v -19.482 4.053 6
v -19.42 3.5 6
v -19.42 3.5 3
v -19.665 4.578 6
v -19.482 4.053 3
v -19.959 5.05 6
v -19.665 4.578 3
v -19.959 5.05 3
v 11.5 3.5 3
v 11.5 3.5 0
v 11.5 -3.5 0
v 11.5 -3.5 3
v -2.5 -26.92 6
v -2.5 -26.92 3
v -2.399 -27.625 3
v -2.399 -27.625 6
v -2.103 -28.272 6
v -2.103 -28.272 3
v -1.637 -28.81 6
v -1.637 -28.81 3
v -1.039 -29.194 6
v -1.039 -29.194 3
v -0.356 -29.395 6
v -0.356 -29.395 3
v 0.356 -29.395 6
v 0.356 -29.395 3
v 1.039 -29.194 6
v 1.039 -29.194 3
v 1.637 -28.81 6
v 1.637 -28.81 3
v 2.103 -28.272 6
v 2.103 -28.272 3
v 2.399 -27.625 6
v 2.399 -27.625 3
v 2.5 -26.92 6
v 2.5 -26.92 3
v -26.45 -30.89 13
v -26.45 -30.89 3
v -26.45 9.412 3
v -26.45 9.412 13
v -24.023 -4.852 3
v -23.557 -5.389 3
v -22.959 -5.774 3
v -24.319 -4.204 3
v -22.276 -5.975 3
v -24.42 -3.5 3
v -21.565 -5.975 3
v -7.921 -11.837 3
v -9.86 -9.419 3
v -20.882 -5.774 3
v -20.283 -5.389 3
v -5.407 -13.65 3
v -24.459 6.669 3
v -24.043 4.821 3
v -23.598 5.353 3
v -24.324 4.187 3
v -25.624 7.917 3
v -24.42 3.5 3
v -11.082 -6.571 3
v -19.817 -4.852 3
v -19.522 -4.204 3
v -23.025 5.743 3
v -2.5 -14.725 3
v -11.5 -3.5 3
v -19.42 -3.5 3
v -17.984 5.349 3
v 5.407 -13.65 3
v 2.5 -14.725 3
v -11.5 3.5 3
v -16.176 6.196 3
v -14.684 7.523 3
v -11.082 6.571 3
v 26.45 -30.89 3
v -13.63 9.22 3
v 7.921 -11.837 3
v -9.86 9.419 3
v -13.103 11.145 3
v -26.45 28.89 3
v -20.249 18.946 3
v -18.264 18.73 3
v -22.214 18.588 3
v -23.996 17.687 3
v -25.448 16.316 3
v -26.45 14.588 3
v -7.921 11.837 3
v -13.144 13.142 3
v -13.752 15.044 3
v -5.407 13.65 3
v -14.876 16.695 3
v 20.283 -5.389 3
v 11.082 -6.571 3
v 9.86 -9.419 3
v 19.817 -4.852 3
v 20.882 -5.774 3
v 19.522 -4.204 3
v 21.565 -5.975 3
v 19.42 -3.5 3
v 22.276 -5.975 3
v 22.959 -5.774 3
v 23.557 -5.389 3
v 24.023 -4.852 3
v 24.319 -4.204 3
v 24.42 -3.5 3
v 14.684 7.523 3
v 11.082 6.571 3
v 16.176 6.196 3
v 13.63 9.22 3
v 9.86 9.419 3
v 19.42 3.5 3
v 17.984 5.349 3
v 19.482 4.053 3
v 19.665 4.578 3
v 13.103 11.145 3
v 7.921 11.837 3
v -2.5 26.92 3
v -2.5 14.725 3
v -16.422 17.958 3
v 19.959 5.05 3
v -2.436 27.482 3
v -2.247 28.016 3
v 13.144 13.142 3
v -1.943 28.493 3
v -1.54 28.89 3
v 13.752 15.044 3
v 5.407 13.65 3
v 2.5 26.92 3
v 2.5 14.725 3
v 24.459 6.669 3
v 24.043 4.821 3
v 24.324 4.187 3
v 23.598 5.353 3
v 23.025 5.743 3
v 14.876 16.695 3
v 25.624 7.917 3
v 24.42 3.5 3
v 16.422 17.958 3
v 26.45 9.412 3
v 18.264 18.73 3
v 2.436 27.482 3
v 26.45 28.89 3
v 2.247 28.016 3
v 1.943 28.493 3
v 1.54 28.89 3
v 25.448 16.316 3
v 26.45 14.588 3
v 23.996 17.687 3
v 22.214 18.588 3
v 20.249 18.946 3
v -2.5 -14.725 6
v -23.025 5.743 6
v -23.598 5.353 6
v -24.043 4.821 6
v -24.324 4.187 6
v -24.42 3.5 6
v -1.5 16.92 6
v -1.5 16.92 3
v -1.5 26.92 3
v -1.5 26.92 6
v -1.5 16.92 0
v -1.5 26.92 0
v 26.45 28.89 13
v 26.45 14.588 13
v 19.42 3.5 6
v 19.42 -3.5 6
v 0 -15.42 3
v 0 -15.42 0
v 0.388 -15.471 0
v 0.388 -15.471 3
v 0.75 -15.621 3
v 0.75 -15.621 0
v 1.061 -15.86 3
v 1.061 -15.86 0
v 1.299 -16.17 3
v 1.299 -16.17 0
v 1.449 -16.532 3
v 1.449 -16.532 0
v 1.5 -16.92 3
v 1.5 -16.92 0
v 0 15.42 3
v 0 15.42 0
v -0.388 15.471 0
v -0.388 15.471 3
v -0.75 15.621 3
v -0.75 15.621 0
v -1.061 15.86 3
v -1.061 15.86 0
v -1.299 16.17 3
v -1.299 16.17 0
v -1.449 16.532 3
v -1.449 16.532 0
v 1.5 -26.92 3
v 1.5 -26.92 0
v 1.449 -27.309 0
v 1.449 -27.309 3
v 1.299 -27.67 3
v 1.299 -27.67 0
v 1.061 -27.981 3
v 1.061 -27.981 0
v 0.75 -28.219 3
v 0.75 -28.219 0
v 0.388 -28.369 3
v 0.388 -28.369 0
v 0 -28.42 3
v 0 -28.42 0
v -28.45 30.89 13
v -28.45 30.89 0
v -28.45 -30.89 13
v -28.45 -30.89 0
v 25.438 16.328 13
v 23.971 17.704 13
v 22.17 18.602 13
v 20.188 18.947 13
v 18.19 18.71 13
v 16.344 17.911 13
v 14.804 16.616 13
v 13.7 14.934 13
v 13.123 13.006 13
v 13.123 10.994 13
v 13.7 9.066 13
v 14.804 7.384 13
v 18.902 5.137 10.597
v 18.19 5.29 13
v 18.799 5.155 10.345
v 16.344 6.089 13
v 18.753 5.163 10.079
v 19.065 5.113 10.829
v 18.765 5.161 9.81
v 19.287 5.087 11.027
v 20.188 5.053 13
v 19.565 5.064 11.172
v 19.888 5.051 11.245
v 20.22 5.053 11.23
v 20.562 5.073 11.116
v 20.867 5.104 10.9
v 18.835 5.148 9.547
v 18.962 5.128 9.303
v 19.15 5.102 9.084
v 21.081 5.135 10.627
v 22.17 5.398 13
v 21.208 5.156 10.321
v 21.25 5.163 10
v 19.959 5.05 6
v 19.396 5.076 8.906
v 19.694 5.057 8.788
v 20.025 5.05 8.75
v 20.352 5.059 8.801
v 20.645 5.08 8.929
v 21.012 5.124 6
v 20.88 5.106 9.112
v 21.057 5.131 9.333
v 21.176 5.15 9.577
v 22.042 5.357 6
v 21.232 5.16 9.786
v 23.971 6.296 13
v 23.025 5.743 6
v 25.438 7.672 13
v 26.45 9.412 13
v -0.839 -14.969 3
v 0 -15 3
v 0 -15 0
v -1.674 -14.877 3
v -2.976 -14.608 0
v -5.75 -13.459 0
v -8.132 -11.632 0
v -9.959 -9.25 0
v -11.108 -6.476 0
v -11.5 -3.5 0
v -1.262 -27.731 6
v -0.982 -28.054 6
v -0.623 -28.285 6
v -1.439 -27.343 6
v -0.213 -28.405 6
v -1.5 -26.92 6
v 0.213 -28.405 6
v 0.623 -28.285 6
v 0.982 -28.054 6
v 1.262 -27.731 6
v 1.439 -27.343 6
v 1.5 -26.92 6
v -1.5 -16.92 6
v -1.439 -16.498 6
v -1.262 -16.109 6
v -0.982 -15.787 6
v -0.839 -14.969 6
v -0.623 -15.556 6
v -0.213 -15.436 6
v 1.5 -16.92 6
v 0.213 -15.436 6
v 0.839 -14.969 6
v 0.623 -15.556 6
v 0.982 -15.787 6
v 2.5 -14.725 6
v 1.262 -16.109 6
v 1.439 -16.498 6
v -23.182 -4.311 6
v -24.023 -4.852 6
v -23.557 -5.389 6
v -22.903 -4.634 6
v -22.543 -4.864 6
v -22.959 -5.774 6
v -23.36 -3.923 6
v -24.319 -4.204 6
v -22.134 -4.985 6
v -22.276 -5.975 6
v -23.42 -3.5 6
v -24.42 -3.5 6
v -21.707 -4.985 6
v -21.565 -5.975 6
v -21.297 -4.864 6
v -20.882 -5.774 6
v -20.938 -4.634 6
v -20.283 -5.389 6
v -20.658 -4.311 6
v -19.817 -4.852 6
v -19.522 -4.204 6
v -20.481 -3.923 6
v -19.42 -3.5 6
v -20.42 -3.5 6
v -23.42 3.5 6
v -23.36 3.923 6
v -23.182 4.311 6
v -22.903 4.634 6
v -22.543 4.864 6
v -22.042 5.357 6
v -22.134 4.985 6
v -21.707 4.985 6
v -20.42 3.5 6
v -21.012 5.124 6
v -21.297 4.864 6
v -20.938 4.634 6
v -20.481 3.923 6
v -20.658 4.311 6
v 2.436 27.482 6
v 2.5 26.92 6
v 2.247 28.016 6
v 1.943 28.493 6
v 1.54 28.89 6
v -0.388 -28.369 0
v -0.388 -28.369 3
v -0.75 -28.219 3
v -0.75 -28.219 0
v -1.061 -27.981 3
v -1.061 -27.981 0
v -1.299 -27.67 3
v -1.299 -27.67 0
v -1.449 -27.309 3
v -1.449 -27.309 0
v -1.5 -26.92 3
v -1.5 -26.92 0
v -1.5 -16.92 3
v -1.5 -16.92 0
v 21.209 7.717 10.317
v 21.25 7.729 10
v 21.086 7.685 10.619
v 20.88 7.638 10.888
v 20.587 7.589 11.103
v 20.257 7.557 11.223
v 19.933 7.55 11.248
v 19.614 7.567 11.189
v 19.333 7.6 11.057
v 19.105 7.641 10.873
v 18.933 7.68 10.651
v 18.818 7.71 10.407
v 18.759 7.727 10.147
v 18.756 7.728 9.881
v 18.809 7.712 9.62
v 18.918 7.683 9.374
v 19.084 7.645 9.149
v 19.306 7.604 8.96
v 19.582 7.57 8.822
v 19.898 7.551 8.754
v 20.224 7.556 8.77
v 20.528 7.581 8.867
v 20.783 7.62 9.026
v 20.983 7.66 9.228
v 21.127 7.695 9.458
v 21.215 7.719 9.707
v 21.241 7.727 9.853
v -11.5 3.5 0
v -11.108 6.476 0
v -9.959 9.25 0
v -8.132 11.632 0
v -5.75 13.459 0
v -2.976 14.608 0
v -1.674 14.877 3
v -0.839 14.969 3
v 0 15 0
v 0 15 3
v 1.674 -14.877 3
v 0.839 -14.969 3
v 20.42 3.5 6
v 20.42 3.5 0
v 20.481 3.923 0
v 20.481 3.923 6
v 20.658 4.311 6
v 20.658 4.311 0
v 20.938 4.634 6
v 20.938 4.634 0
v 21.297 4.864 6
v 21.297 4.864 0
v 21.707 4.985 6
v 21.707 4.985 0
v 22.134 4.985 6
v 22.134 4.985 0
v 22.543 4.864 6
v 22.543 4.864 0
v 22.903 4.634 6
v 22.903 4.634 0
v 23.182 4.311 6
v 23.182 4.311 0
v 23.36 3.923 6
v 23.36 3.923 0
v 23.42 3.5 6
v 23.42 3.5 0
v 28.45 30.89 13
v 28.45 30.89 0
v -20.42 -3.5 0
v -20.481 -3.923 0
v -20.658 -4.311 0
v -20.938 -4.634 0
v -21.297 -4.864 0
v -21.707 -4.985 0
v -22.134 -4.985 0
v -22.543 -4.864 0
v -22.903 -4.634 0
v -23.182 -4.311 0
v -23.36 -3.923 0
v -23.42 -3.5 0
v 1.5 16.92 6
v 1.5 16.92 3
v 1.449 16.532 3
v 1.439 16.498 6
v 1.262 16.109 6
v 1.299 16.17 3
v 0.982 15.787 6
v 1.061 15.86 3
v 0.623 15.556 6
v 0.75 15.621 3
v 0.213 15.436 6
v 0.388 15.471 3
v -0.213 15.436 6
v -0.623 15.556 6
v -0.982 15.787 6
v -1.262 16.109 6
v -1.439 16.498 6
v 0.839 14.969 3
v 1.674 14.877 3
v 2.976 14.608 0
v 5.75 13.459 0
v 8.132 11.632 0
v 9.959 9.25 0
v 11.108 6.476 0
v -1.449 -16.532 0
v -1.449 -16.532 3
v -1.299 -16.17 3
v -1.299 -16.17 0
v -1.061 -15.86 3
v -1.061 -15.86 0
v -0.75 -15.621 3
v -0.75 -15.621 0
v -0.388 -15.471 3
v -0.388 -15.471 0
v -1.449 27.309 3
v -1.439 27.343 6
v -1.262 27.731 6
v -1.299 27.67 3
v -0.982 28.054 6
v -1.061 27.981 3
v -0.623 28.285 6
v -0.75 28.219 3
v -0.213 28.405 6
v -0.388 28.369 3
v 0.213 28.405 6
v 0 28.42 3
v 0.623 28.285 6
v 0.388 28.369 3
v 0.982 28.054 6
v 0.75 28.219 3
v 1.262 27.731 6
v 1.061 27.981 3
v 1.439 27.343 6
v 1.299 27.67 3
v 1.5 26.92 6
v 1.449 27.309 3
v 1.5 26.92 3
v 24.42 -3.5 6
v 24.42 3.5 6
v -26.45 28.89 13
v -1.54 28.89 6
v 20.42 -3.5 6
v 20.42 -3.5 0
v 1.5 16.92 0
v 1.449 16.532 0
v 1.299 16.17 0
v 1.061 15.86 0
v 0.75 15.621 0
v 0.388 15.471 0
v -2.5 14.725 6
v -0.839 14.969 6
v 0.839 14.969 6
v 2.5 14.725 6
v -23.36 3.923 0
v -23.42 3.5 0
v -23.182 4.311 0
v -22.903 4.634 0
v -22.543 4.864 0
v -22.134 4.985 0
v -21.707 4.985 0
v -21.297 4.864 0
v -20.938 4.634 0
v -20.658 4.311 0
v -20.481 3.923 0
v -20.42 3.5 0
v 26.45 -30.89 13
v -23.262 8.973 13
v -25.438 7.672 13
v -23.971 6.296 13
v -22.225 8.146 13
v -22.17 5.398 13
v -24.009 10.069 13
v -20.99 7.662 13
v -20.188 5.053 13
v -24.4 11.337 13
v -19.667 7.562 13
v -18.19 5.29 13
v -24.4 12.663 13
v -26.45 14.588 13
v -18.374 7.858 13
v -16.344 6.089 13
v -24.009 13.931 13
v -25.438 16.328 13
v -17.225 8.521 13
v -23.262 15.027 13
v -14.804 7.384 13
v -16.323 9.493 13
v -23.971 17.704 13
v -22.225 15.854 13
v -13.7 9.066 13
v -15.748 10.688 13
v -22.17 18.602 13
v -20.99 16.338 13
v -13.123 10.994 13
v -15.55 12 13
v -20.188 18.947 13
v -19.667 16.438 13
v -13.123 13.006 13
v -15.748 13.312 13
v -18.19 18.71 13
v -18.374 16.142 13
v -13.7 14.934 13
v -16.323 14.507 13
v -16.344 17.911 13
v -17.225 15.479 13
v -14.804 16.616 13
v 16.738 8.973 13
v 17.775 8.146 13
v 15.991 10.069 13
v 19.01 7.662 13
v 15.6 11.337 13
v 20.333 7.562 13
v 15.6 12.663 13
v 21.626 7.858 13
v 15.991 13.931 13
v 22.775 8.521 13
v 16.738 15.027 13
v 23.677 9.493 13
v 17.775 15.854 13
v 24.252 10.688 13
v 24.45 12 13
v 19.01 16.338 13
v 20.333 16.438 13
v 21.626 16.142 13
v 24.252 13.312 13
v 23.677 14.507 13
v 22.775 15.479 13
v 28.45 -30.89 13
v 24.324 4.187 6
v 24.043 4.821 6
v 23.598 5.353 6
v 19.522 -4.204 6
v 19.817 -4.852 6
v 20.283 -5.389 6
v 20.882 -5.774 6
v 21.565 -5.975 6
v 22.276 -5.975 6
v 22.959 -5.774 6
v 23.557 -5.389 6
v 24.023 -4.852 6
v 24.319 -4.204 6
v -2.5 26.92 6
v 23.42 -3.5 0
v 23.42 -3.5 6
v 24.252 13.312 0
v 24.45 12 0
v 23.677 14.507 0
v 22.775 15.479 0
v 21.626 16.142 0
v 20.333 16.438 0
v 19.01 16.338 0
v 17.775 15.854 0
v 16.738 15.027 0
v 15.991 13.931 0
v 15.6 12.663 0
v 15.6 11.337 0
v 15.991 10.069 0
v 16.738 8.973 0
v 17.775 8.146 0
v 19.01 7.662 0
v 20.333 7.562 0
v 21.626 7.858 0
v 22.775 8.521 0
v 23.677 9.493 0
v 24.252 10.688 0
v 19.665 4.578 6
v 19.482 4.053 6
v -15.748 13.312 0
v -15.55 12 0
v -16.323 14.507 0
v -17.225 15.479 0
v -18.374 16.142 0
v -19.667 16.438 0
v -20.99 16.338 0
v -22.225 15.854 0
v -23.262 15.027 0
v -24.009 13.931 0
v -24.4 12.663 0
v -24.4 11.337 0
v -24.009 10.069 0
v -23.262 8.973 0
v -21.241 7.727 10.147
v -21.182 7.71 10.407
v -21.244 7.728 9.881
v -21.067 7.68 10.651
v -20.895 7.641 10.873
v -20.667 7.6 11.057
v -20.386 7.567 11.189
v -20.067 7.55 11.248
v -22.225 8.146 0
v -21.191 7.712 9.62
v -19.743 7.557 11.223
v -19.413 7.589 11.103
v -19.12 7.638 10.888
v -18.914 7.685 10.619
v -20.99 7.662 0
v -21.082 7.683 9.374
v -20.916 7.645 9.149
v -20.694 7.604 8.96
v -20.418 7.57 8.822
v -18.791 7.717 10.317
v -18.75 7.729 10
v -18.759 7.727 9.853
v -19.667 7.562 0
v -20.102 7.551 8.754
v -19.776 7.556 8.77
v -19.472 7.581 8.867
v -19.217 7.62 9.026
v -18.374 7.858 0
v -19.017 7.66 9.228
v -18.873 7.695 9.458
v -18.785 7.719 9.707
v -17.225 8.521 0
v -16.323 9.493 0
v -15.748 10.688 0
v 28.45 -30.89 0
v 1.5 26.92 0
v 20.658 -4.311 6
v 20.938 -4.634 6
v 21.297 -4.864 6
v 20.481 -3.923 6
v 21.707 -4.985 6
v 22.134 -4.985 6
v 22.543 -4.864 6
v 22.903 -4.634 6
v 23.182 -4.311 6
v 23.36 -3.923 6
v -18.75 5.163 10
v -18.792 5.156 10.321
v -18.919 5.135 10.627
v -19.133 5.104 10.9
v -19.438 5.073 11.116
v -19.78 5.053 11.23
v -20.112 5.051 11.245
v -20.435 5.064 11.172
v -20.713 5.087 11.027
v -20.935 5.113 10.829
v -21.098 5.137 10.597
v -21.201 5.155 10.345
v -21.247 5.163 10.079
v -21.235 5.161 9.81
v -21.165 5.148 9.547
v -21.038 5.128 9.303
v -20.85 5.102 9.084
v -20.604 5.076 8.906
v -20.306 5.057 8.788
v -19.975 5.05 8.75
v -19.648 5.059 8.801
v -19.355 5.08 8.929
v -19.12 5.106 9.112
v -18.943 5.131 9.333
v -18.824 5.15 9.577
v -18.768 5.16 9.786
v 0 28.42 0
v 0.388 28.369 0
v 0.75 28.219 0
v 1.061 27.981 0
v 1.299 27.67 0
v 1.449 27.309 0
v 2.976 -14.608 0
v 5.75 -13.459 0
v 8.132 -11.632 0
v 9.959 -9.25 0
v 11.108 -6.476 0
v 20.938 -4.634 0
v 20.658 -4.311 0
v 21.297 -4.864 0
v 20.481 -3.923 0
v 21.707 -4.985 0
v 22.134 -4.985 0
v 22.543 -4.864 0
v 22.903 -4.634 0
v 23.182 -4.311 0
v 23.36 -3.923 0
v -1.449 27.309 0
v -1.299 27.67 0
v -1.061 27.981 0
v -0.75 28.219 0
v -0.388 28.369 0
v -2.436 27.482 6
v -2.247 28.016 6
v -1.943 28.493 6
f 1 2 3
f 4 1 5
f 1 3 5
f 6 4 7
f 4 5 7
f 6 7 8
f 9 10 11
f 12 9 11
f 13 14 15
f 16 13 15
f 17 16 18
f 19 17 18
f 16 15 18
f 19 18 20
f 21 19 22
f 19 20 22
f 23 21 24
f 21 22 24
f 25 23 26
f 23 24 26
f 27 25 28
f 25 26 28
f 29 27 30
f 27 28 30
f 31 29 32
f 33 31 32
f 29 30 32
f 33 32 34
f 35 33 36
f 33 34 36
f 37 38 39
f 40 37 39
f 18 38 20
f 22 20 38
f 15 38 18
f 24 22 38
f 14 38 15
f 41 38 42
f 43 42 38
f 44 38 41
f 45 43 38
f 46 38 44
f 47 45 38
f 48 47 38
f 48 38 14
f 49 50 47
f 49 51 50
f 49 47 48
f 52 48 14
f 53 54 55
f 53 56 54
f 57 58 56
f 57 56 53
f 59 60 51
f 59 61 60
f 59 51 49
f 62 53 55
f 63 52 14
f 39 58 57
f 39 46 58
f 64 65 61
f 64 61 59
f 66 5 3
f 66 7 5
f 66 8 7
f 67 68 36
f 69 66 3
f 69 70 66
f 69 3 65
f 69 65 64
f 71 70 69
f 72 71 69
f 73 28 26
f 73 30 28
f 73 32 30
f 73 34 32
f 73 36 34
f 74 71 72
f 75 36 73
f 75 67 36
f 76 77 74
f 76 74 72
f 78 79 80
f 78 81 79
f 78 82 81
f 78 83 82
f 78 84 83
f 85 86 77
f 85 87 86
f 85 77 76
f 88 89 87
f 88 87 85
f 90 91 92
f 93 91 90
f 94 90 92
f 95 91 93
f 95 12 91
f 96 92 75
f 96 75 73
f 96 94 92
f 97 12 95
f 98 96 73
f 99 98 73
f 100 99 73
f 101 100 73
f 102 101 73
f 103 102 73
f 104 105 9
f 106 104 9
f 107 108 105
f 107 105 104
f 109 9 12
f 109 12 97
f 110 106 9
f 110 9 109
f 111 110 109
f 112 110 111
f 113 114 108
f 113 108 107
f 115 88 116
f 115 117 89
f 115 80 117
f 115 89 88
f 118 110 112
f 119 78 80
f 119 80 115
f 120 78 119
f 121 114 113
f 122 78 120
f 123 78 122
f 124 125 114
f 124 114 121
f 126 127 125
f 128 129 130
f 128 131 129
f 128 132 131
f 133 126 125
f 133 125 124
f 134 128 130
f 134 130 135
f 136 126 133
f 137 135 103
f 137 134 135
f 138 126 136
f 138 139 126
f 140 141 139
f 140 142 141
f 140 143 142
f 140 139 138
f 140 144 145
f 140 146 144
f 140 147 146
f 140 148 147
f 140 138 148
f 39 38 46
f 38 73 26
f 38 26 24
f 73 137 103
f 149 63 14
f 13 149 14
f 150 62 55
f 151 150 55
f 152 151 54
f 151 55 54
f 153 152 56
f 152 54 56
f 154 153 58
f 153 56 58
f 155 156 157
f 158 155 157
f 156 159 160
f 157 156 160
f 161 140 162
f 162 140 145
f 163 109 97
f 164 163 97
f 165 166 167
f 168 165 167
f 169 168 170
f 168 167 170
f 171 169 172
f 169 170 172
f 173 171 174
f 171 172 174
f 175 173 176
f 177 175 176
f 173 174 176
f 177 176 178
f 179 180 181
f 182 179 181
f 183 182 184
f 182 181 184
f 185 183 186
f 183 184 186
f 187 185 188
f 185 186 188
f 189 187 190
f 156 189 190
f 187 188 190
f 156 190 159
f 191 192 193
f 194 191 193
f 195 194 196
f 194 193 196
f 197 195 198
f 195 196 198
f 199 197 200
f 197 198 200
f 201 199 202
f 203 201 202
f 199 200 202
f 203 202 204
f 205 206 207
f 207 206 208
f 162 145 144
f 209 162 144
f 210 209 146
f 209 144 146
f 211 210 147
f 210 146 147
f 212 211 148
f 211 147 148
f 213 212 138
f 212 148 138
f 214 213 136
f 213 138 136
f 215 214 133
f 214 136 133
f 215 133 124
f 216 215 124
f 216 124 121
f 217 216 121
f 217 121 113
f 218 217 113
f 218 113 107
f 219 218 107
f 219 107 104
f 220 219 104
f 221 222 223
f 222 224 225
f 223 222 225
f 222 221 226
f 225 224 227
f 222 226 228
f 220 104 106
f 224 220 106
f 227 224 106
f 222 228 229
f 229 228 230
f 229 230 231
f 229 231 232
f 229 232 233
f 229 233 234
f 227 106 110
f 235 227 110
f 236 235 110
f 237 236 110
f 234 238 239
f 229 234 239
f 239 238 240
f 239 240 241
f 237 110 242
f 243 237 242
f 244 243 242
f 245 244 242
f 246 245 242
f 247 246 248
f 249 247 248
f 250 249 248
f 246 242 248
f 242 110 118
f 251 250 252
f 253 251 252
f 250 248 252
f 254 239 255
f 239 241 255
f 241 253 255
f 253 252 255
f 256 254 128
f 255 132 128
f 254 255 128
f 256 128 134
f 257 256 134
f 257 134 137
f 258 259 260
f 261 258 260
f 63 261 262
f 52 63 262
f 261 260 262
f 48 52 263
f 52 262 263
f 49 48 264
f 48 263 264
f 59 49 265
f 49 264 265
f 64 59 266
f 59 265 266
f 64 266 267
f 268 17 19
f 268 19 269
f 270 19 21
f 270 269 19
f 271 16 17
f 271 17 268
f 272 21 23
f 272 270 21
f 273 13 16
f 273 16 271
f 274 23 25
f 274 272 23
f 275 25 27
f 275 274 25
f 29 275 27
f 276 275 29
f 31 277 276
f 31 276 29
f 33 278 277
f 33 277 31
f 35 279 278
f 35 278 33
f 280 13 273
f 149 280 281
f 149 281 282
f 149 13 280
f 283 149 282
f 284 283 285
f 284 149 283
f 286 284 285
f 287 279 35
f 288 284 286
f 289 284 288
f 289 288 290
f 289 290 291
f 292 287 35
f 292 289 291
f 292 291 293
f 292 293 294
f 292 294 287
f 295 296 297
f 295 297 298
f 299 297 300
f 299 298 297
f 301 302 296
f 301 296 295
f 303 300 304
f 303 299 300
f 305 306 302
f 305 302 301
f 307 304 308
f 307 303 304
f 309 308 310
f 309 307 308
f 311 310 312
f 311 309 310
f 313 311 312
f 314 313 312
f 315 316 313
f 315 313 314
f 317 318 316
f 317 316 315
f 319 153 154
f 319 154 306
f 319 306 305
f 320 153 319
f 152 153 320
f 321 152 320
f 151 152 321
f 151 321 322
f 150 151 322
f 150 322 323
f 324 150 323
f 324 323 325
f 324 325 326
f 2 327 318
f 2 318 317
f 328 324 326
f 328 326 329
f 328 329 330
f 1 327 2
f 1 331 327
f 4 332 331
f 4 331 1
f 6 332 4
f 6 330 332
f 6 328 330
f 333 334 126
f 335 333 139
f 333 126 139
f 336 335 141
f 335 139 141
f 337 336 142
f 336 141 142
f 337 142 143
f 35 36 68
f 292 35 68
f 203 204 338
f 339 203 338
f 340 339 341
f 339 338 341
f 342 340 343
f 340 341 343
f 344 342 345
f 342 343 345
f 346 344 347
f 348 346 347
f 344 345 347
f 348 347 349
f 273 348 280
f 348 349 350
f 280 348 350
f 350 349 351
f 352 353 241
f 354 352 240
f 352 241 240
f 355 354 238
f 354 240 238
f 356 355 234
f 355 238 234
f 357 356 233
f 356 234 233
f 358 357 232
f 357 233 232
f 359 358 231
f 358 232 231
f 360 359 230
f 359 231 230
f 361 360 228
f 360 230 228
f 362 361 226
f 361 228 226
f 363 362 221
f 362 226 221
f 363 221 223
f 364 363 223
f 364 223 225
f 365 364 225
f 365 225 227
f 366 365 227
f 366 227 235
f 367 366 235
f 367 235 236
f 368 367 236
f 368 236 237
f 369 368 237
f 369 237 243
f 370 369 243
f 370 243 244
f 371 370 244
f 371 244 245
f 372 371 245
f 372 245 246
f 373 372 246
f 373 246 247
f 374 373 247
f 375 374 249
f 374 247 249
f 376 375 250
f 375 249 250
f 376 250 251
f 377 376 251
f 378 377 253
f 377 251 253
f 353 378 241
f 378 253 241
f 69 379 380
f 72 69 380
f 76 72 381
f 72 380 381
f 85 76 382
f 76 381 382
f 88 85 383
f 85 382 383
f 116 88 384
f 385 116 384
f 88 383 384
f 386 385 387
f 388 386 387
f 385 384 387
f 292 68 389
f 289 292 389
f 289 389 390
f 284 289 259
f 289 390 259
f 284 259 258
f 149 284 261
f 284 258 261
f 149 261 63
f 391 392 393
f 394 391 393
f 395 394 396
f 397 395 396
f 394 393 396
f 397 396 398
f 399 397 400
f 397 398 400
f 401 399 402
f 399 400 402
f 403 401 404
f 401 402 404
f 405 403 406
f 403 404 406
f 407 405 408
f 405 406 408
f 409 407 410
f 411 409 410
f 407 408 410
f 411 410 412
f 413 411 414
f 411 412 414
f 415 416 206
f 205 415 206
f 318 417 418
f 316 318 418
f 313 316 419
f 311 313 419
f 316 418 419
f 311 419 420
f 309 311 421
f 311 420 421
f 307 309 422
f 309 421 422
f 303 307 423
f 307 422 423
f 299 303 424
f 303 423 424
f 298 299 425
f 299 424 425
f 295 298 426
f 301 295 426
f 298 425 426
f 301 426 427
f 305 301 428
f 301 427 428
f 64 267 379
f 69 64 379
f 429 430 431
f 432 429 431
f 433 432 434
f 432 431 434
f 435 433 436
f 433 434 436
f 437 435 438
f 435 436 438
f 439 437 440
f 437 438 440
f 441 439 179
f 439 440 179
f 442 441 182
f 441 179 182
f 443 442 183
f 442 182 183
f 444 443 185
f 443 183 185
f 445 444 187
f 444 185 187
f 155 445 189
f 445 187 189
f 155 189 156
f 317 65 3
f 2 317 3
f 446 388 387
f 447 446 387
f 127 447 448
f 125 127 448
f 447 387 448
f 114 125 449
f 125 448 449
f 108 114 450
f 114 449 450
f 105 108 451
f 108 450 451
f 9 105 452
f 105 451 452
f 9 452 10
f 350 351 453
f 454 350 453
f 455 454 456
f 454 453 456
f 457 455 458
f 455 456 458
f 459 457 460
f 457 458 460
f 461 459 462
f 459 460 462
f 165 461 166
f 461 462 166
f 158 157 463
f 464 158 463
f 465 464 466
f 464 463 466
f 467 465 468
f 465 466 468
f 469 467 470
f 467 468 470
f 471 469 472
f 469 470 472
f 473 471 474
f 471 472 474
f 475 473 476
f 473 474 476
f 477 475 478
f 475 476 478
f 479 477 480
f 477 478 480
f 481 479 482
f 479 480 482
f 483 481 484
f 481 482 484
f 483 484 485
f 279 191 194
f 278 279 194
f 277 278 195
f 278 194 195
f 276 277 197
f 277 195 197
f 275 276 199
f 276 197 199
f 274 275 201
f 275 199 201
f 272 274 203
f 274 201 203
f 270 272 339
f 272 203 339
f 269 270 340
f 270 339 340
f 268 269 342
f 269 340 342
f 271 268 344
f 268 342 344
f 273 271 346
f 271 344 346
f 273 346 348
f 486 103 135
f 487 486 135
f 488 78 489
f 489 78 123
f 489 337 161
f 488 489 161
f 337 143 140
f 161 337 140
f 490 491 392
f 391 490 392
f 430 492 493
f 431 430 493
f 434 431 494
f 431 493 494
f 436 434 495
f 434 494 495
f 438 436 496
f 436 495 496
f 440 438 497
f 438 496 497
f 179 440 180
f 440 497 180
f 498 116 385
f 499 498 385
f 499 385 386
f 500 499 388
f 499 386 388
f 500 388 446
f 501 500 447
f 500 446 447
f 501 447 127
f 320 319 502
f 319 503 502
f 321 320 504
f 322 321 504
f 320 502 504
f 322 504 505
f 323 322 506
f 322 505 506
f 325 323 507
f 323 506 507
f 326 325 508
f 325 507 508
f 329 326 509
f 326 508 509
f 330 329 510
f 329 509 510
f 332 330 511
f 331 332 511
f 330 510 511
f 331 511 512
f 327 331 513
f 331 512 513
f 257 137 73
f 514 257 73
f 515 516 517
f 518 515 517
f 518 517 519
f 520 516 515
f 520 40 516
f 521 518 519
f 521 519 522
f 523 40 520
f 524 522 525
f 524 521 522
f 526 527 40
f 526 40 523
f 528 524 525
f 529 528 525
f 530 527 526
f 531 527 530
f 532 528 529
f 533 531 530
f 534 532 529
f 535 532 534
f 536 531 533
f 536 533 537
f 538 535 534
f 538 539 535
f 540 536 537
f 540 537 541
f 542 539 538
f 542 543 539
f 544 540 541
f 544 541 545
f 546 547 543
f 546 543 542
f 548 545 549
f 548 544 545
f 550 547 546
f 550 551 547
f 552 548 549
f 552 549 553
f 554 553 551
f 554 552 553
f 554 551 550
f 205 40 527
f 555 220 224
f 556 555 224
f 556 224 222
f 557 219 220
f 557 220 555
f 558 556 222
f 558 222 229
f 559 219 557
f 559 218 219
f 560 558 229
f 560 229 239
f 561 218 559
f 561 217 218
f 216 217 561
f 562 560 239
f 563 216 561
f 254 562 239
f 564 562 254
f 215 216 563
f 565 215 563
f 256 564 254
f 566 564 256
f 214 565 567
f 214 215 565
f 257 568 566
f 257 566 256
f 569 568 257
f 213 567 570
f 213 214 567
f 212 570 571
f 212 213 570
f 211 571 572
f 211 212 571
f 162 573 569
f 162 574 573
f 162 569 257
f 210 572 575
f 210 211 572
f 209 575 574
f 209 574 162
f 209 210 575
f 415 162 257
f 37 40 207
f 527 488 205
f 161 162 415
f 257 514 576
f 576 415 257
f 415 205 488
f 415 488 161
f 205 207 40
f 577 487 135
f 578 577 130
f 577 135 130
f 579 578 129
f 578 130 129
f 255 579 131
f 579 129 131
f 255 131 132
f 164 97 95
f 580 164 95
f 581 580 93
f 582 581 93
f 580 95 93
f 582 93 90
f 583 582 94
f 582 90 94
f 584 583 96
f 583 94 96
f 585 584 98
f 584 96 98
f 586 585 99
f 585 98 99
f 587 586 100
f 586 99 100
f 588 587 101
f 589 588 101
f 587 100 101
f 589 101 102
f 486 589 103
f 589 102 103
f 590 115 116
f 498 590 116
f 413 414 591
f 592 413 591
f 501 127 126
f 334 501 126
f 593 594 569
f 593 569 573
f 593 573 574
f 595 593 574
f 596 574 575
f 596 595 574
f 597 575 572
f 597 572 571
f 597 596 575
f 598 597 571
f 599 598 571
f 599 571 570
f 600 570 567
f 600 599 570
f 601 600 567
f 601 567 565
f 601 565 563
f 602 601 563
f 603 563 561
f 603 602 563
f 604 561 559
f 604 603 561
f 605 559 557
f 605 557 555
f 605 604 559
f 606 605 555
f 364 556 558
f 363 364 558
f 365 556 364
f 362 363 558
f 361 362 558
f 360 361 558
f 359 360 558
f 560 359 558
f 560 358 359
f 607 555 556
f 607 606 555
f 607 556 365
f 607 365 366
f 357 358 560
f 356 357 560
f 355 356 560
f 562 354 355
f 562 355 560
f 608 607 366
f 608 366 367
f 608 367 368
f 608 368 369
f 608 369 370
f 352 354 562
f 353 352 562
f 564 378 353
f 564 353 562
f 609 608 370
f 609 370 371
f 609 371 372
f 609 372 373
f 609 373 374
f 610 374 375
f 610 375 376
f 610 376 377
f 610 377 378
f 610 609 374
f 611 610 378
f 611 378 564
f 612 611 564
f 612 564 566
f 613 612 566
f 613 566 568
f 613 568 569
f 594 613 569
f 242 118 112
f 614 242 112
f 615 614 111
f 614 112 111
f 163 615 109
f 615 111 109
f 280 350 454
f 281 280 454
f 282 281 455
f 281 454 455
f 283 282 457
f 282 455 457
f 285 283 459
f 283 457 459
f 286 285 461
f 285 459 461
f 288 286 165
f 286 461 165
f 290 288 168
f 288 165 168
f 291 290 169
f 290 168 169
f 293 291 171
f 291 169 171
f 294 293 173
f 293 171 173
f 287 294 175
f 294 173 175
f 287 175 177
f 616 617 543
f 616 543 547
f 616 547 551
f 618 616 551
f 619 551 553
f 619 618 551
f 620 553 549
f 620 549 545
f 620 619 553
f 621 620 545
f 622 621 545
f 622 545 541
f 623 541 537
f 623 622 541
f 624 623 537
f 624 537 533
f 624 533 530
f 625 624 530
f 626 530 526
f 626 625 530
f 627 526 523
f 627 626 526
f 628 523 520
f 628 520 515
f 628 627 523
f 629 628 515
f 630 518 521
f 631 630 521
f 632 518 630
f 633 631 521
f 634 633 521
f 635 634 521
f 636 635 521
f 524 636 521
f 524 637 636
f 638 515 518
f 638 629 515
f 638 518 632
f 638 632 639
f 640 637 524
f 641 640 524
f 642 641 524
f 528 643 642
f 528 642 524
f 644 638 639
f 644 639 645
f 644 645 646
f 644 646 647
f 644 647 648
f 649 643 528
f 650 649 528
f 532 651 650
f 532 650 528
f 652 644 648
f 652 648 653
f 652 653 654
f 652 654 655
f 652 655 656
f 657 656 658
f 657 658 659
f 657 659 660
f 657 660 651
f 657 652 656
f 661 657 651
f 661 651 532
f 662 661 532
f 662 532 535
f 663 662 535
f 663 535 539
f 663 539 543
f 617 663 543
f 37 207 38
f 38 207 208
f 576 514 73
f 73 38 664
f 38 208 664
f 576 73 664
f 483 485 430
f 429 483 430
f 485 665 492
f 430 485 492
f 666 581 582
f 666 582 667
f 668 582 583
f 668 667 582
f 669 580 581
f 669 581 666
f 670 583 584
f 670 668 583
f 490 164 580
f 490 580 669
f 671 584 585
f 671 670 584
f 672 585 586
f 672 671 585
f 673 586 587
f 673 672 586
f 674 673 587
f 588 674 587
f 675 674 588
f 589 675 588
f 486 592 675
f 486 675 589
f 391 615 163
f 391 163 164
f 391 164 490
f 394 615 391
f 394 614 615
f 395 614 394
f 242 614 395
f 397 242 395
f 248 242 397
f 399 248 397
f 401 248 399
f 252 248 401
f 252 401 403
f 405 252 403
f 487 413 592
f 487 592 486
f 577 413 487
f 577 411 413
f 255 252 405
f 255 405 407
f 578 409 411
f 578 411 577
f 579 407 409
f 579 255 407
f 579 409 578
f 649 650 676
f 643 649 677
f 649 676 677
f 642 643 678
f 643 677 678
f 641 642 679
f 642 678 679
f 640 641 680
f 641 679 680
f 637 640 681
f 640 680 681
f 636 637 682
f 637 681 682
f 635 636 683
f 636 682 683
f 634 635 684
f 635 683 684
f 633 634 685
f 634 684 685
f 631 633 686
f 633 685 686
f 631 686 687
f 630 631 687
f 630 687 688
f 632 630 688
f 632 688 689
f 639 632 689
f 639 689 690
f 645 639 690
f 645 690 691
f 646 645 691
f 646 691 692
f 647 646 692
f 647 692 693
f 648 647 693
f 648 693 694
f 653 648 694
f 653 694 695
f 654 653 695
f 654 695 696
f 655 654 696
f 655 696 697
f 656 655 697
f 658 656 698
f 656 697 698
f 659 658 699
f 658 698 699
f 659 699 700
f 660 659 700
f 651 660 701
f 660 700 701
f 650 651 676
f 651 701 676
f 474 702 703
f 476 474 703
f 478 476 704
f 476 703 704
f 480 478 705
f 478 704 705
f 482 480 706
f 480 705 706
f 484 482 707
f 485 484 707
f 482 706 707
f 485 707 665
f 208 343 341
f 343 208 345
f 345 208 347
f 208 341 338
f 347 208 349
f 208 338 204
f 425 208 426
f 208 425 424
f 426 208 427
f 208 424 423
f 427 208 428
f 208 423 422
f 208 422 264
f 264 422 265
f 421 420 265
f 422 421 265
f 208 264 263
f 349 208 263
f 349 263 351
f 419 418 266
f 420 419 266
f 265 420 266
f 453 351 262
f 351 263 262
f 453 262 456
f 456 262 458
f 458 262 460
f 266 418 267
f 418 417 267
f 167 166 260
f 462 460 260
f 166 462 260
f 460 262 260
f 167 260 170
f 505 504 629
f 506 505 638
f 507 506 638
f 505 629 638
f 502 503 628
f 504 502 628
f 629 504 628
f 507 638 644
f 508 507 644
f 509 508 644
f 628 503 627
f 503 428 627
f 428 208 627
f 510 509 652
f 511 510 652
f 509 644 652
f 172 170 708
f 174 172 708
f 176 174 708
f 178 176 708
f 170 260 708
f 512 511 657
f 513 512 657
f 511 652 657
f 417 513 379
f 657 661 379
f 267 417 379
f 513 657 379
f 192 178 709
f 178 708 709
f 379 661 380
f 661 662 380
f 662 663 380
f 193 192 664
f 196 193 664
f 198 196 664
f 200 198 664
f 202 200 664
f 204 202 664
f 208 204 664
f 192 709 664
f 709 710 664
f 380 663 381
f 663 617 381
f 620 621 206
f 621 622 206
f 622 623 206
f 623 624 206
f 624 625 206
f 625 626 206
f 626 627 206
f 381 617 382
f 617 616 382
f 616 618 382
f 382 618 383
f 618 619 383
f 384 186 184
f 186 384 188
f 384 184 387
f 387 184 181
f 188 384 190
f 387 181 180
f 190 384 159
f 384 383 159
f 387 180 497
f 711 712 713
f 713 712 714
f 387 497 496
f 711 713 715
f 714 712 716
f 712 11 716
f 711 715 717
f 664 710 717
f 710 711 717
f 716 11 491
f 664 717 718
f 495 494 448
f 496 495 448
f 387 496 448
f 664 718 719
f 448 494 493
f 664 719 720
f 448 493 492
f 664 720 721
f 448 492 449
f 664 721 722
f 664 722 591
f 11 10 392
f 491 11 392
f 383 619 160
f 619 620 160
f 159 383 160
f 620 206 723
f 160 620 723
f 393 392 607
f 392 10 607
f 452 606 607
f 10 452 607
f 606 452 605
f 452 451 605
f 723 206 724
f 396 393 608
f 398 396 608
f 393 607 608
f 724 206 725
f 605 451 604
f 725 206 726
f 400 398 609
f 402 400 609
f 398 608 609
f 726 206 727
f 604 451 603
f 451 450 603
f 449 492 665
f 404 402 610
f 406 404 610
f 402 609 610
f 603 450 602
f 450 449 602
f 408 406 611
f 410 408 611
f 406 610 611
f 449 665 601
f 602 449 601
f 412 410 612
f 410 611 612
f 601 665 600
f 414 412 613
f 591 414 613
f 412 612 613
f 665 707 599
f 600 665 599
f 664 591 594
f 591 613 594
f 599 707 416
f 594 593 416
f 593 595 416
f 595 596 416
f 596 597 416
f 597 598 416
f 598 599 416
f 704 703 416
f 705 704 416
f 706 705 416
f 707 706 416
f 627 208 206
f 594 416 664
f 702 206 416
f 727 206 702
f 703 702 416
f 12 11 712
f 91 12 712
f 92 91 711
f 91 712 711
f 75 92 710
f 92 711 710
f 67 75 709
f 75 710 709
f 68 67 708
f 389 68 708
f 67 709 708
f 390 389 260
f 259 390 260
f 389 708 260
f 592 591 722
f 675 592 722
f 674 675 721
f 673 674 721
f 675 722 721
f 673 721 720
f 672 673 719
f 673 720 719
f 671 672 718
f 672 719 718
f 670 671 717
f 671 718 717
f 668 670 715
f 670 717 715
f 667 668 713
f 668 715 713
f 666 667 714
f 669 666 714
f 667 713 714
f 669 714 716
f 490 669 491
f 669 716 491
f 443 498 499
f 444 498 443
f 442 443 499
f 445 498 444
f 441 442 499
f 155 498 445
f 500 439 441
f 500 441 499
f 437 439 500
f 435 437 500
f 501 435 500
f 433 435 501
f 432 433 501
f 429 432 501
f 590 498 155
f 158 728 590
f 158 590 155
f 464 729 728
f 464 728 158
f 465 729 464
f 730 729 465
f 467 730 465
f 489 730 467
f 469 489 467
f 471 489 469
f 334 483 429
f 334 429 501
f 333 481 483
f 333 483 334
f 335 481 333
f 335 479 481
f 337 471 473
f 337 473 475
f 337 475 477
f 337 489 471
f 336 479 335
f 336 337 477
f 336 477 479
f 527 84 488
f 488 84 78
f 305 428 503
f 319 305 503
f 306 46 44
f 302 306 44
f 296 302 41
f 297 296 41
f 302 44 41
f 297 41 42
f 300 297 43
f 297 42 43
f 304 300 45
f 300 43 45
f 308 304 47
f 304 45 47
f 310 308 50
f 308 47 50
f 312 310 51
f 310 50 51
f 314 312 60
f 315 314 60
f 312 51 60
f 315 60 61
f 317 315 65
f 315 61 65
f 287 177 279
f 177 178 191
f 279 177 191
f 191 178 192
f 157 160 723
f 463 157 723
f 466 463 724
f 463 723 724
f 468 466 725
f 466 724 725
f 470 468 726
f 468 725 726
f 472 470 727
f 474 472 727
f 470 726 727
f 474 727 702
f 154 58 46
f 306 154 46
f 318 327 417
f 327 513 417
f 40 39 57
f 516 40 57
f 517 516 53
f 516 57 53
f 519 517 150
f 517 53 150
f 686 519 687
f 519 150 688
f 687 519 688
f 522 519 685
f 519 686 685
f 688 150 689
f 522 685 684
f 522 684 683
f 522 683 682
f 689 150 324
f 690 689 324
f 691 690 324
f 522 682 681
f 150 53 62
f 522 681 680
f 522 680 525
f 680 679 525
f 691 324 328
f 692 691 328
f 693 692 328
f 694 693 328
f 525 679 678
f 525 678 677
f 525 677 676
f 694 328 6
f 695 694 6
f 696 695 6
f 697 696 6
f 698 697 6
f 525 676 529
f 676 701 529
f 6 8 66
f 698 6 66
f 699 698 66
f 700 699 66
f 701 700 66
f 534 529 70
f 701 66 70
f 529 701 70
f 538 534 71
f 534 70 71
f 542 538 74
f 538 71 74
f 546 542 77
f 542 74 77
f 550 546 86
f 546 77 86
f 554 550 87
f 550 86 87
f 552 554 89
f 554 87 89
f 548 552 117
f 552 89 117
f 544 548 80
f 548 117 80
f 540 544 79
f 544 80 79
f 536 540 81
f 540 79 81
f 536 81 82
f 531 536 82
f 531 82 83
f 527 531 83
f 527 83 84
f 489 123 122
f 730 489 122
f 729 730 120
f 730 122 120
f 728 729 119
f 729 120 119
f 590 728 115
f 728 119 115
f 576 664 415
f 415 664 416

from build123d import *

# Parameters (mm, degrees)
F0_W     = 56.9
F0_H     = 61.77927
F0_R     = 4.45
F1_DEPTH = 3
F2_R     = 4.45
F4_DEPTH = 10
F5_DEPTH = 3
F6_R     = 1.25
F7_DEPTH = 40


with BuildPart() as f1:
    # F0 (on Top) → F1 (new body)
    with BuildSketch(Plane.XY):
        Rectangle(F0_W, F0_H)
        with BuildLine():
            Line((1.5, -16.92031), (1.5, -26.92031))
            ThreePointArc((1.5, -26.92031), (1.06066, -27.98097), (0, -28.42031))
            ThreePointArc((0, -28.42031), (-1.06066, -27.98097), (-1.5, -26.92031))
            Line((-1.5, -26.92031), (-1.5, -16.92031))
            ThreePointArc((-1.5, -16.92031), (-1.06066, -15.85965), (0, -15.42031))
            ThreePointArc((0, -15.42031), (1.06066, -15.85965), (1.5, -16.92031))
        make_face(mode=Mode.SUBTRACT)
        with BuildLine():
            Line((-23.42031, -3.5), (-23.42031, 0))
            Line((-23.42031, 0), (-23.42031, 3.5))
            ThreePointArc((-23.42031, 3.5), (-21.92031, 5), (-20.42031, 3.5))
            Line((-20.42031, 3.5), (-20.42031, 0))
            Line((-20.42031, 0), (-20.42031, -3.5))
            ThreePointArc((-20.42031, -3.5), (-21.92031, -5), (-23.42031, -3.5))
        make_face(mode=Mode.SUBTRACT)
        with Locations((-20, 12)):
            Circle(F0_R, mode=Mode.SUBTRACT)
        with BuildLine():
            Line((-11.5, -3.5), (-11.5, 0))
            Line((-11.5, 0), (-11.5, 3.5))
            ThreePointArc((-11.5, 3.5), (-8.131728, 11.631728), (0, 15))
            ThreePointArc((0, 15), (8.131728, 11.631728), (11.5, 3.5))
            Line((11.5, 3.5), (11.5, 0))
            Line((11.5, 0), (11.5, -3.5))
            ThreePointArc((11.5, -3.5), (8.131728, -11.631728), (0, -15))
            ThreePointArc((0, -15), (-8.131728, -11.631728), (-11.5, -3.5))
        make_face(mode=Mode.SUBTRACT)
        with BuildLine():
            Line((20.42031, -3.5), (20.42031, 0))
            Line((20.42031, 0), (20.42031, 3.5))
            ThreePointArc((20.42031, 3.5), (21.92031, 5), (23.42031, 3.5))
            Line((23.42031, 3.5), (23.42031, 0))
            Line((23.42031, 0), (23.42031, -3.5))
            ThreePointArc((23.42031, -3.5), (21.92031, -5), (20.42031, -3.5))
        make_face(mode=Mode.SUBTRACT)
        with Locations((20, 12)):
            Circle(F0_R, mode=Mode.SUBTRACT)
        with BuildLine():
            Line((-1.5, 16.92031), (-1.5, 26.92031))
            ThreePointArc((-1.5, 26.92031), (-1.06066, 27.98097), (0, 28.42031))
            ThreePointArc((0, 28.42031), (1.06066, 27.98097), (1.5, 26.92031))
            Line((1.5, 26.92031), (1.5, 16.92031))
            ThreePointArc((1.5, 16.92031), (1.06066, 15.85965), (0, 15.42031))
            ThreePointArc((0, 15.42031), (-1.06066, 15.85965), (-1.5, 16.92031))
        make_face(mode=Mode.SUBTRACT)
    extrude(amount=F1_DEPTH)

    # F2 (on face) → F4 (join)
    with BuildSketch(Plane.XY.offset(3)):
        with BuildLine():
            Line((-26.45, -30.889635), (-26.45, 9.411564))
            ThreePointArc((-26.45, 9.411564), (-13.05, 12), (-26.45, 14.588436))
            Line((-26.45, 14.588436), (-26.45, 28.889635))
            Line((-26.45, 28.889635), (26.45, 28.889635))
            Line((26.45, 28.889635), (26.45, 14.588436))
            ThreePointArc((26.45, 14.588436), (13.05, 12), (26.45, 9.411564))
            Line((26.45, 9.411564), (26.45, -30.889635))
            Line((26.45, -30.889635), (28.45, -30.889635))
            Line((28.45, -30.889635), (28.45, 30.889635))
            Line((28.45, 30.889635), (-28.45, 30.889635))
            Line((-28.45, 30.889635), (-28.45, -30.889635))
            Line((-28.45, -30.889635), (-26.45, -30.889635))
        make_face()
        with Locations((-20, 12)):
            Circle(F2_R, mode=Mode.SUBTRACT)
        with Locations((20, 12)):
            Circle(F2_R, mode=Mode.SUBTRACT)
    extrude(amount=F4_DEPTH)

    # F3 (on face) → F5 (join)
    with BuildSketch(Plane.XY.offset(3)):
        with BuildLine():
            ThreePointArc((-19.42031, 3.5), (-21.92031, 6), (-24.42031, 3.5))
            Line((-24.42031, 3.5), (-24.42031, -3.5))
            ThreePointArc((-24.42031, -3.5), (-21.92031, -6), (-19.42031, -3.5))
            Line((-19.42031, -3.5), (-19.42031, 3.5))
        make_face()
        with BuildLine():
            ThreePointArc((-23.42031, 3.5), (-21.92031, 5), (-20.42031, 3.5))
            Line((-20.42031, 3.5), (-20.42031, -3.5))
            ThreePointArc((-20.42031, -3.5), (-21.92031, -5), (-23.42031, -3.5))
            Line((-23.42031, -3.5), (-23.42031, 3.5))
        make_face(mode=Mode.SUBTRACT)
        with BuildLine():
            Line((2.5, 16.92031), (2.5, 26.92031))
            ThreePointArc((2.5, 26.92031), (0, 29.42031), (-2.5, 26.92031))
            Line((-2.5, 26.92031), (-2.5, 16.92031))
            Line((-2.5, 16.92031), (-2.5, 14.724972))
            ThreePointArc((-2.5, 14.724972), (0, 15), (2.5, 14.724972))
            Line((2.5, 14.724972), (2.5, 16.92031))
        make_face()
        with BuildLine():
            Line((-1.5, 16.92031), (-1.5, 26.92031))
            ThreePointArc((-1.5, 26.92031), (0, 28.42031), (1.5, 26.92031))
            Line((1.5, 26.92031), (1.5, 16.92031))
            ThreePointArc((1.5, 16.92031), (0, 15.42031), (-1.5, 16.92031))
        make_face(mode=Mode.SUBTRACT)
        with BuildLine():
            Line((24.42031, -3.5), (24.42031, 3.5))
            ThreePointArc((24.42031, 3.5), (21.92031, 6), (19.42031, 3.5))
            Line((19.42031, 3.5), (19.42031, -3.5))
            ThreePointArc((19.42031, -3.5), (21.92031, -6), (24.42031, -3.5))
        make_face()
        with BuildLine():
            ThreePointArc((20.42031, 3.5), (21.92031, 5), (23.42031, 3.5))
            Line((23.42031, 3.5), (23.42031, -3.5))
            ThreePointArc((23.42031, -3.5), (21.92031, -5), (20.42031, -3.5))
            Line((20.42031, -3.5), (20.42031, 3.5))
        make_face(mode=Mode.SUBTRACT)
        with BuildLine():
            ThreePointArc((-2.5, -26.92031), (0, -29.42031), (2.5, -26.92031))
            Line((2.5, -26.92031), (2.5, -16.92031))
            Line((2.5, -16.92031), (2.5, -14.724972))
            ThreePointArc((2.5, -14.724972), (0, -15), (-2.5, -14.724972))
            Line((-2.5, -14.724972), (-2.5, -16.92031))
            Line((-2.5, -16.92031), (-2.5, -26.92031))
        make_face()
        with BuildLine():
            Line((1.5, -16.92031), (1.5, -26.92031))
            ThreePointArc((1.5, -26.92031), (0, -28.42031), (-1.5, -26.92031))
            Line((-1.5, -26.92031), (-1.5, -16.92031))
            ThreePointArc((-1.5, -16.92031), (0, -15.42031), (1.5, -16.92031))
        make_face(mode=Mode.SUBTRACT)
    extrude(amount=F5_DEPTH)

    # F6 (on face) → F7 (cut)
    with BuildSketch(Plane.XZ.offset(30.889635)):
        with Locations((-20, 10)):
            Circle(F6_R)
        with Locations((20, 10)):
            Circle(F6_R)
    extrude(amount=-F7_DEPTH, mode=Mode.SUBTRACT)


solid = f1.part
